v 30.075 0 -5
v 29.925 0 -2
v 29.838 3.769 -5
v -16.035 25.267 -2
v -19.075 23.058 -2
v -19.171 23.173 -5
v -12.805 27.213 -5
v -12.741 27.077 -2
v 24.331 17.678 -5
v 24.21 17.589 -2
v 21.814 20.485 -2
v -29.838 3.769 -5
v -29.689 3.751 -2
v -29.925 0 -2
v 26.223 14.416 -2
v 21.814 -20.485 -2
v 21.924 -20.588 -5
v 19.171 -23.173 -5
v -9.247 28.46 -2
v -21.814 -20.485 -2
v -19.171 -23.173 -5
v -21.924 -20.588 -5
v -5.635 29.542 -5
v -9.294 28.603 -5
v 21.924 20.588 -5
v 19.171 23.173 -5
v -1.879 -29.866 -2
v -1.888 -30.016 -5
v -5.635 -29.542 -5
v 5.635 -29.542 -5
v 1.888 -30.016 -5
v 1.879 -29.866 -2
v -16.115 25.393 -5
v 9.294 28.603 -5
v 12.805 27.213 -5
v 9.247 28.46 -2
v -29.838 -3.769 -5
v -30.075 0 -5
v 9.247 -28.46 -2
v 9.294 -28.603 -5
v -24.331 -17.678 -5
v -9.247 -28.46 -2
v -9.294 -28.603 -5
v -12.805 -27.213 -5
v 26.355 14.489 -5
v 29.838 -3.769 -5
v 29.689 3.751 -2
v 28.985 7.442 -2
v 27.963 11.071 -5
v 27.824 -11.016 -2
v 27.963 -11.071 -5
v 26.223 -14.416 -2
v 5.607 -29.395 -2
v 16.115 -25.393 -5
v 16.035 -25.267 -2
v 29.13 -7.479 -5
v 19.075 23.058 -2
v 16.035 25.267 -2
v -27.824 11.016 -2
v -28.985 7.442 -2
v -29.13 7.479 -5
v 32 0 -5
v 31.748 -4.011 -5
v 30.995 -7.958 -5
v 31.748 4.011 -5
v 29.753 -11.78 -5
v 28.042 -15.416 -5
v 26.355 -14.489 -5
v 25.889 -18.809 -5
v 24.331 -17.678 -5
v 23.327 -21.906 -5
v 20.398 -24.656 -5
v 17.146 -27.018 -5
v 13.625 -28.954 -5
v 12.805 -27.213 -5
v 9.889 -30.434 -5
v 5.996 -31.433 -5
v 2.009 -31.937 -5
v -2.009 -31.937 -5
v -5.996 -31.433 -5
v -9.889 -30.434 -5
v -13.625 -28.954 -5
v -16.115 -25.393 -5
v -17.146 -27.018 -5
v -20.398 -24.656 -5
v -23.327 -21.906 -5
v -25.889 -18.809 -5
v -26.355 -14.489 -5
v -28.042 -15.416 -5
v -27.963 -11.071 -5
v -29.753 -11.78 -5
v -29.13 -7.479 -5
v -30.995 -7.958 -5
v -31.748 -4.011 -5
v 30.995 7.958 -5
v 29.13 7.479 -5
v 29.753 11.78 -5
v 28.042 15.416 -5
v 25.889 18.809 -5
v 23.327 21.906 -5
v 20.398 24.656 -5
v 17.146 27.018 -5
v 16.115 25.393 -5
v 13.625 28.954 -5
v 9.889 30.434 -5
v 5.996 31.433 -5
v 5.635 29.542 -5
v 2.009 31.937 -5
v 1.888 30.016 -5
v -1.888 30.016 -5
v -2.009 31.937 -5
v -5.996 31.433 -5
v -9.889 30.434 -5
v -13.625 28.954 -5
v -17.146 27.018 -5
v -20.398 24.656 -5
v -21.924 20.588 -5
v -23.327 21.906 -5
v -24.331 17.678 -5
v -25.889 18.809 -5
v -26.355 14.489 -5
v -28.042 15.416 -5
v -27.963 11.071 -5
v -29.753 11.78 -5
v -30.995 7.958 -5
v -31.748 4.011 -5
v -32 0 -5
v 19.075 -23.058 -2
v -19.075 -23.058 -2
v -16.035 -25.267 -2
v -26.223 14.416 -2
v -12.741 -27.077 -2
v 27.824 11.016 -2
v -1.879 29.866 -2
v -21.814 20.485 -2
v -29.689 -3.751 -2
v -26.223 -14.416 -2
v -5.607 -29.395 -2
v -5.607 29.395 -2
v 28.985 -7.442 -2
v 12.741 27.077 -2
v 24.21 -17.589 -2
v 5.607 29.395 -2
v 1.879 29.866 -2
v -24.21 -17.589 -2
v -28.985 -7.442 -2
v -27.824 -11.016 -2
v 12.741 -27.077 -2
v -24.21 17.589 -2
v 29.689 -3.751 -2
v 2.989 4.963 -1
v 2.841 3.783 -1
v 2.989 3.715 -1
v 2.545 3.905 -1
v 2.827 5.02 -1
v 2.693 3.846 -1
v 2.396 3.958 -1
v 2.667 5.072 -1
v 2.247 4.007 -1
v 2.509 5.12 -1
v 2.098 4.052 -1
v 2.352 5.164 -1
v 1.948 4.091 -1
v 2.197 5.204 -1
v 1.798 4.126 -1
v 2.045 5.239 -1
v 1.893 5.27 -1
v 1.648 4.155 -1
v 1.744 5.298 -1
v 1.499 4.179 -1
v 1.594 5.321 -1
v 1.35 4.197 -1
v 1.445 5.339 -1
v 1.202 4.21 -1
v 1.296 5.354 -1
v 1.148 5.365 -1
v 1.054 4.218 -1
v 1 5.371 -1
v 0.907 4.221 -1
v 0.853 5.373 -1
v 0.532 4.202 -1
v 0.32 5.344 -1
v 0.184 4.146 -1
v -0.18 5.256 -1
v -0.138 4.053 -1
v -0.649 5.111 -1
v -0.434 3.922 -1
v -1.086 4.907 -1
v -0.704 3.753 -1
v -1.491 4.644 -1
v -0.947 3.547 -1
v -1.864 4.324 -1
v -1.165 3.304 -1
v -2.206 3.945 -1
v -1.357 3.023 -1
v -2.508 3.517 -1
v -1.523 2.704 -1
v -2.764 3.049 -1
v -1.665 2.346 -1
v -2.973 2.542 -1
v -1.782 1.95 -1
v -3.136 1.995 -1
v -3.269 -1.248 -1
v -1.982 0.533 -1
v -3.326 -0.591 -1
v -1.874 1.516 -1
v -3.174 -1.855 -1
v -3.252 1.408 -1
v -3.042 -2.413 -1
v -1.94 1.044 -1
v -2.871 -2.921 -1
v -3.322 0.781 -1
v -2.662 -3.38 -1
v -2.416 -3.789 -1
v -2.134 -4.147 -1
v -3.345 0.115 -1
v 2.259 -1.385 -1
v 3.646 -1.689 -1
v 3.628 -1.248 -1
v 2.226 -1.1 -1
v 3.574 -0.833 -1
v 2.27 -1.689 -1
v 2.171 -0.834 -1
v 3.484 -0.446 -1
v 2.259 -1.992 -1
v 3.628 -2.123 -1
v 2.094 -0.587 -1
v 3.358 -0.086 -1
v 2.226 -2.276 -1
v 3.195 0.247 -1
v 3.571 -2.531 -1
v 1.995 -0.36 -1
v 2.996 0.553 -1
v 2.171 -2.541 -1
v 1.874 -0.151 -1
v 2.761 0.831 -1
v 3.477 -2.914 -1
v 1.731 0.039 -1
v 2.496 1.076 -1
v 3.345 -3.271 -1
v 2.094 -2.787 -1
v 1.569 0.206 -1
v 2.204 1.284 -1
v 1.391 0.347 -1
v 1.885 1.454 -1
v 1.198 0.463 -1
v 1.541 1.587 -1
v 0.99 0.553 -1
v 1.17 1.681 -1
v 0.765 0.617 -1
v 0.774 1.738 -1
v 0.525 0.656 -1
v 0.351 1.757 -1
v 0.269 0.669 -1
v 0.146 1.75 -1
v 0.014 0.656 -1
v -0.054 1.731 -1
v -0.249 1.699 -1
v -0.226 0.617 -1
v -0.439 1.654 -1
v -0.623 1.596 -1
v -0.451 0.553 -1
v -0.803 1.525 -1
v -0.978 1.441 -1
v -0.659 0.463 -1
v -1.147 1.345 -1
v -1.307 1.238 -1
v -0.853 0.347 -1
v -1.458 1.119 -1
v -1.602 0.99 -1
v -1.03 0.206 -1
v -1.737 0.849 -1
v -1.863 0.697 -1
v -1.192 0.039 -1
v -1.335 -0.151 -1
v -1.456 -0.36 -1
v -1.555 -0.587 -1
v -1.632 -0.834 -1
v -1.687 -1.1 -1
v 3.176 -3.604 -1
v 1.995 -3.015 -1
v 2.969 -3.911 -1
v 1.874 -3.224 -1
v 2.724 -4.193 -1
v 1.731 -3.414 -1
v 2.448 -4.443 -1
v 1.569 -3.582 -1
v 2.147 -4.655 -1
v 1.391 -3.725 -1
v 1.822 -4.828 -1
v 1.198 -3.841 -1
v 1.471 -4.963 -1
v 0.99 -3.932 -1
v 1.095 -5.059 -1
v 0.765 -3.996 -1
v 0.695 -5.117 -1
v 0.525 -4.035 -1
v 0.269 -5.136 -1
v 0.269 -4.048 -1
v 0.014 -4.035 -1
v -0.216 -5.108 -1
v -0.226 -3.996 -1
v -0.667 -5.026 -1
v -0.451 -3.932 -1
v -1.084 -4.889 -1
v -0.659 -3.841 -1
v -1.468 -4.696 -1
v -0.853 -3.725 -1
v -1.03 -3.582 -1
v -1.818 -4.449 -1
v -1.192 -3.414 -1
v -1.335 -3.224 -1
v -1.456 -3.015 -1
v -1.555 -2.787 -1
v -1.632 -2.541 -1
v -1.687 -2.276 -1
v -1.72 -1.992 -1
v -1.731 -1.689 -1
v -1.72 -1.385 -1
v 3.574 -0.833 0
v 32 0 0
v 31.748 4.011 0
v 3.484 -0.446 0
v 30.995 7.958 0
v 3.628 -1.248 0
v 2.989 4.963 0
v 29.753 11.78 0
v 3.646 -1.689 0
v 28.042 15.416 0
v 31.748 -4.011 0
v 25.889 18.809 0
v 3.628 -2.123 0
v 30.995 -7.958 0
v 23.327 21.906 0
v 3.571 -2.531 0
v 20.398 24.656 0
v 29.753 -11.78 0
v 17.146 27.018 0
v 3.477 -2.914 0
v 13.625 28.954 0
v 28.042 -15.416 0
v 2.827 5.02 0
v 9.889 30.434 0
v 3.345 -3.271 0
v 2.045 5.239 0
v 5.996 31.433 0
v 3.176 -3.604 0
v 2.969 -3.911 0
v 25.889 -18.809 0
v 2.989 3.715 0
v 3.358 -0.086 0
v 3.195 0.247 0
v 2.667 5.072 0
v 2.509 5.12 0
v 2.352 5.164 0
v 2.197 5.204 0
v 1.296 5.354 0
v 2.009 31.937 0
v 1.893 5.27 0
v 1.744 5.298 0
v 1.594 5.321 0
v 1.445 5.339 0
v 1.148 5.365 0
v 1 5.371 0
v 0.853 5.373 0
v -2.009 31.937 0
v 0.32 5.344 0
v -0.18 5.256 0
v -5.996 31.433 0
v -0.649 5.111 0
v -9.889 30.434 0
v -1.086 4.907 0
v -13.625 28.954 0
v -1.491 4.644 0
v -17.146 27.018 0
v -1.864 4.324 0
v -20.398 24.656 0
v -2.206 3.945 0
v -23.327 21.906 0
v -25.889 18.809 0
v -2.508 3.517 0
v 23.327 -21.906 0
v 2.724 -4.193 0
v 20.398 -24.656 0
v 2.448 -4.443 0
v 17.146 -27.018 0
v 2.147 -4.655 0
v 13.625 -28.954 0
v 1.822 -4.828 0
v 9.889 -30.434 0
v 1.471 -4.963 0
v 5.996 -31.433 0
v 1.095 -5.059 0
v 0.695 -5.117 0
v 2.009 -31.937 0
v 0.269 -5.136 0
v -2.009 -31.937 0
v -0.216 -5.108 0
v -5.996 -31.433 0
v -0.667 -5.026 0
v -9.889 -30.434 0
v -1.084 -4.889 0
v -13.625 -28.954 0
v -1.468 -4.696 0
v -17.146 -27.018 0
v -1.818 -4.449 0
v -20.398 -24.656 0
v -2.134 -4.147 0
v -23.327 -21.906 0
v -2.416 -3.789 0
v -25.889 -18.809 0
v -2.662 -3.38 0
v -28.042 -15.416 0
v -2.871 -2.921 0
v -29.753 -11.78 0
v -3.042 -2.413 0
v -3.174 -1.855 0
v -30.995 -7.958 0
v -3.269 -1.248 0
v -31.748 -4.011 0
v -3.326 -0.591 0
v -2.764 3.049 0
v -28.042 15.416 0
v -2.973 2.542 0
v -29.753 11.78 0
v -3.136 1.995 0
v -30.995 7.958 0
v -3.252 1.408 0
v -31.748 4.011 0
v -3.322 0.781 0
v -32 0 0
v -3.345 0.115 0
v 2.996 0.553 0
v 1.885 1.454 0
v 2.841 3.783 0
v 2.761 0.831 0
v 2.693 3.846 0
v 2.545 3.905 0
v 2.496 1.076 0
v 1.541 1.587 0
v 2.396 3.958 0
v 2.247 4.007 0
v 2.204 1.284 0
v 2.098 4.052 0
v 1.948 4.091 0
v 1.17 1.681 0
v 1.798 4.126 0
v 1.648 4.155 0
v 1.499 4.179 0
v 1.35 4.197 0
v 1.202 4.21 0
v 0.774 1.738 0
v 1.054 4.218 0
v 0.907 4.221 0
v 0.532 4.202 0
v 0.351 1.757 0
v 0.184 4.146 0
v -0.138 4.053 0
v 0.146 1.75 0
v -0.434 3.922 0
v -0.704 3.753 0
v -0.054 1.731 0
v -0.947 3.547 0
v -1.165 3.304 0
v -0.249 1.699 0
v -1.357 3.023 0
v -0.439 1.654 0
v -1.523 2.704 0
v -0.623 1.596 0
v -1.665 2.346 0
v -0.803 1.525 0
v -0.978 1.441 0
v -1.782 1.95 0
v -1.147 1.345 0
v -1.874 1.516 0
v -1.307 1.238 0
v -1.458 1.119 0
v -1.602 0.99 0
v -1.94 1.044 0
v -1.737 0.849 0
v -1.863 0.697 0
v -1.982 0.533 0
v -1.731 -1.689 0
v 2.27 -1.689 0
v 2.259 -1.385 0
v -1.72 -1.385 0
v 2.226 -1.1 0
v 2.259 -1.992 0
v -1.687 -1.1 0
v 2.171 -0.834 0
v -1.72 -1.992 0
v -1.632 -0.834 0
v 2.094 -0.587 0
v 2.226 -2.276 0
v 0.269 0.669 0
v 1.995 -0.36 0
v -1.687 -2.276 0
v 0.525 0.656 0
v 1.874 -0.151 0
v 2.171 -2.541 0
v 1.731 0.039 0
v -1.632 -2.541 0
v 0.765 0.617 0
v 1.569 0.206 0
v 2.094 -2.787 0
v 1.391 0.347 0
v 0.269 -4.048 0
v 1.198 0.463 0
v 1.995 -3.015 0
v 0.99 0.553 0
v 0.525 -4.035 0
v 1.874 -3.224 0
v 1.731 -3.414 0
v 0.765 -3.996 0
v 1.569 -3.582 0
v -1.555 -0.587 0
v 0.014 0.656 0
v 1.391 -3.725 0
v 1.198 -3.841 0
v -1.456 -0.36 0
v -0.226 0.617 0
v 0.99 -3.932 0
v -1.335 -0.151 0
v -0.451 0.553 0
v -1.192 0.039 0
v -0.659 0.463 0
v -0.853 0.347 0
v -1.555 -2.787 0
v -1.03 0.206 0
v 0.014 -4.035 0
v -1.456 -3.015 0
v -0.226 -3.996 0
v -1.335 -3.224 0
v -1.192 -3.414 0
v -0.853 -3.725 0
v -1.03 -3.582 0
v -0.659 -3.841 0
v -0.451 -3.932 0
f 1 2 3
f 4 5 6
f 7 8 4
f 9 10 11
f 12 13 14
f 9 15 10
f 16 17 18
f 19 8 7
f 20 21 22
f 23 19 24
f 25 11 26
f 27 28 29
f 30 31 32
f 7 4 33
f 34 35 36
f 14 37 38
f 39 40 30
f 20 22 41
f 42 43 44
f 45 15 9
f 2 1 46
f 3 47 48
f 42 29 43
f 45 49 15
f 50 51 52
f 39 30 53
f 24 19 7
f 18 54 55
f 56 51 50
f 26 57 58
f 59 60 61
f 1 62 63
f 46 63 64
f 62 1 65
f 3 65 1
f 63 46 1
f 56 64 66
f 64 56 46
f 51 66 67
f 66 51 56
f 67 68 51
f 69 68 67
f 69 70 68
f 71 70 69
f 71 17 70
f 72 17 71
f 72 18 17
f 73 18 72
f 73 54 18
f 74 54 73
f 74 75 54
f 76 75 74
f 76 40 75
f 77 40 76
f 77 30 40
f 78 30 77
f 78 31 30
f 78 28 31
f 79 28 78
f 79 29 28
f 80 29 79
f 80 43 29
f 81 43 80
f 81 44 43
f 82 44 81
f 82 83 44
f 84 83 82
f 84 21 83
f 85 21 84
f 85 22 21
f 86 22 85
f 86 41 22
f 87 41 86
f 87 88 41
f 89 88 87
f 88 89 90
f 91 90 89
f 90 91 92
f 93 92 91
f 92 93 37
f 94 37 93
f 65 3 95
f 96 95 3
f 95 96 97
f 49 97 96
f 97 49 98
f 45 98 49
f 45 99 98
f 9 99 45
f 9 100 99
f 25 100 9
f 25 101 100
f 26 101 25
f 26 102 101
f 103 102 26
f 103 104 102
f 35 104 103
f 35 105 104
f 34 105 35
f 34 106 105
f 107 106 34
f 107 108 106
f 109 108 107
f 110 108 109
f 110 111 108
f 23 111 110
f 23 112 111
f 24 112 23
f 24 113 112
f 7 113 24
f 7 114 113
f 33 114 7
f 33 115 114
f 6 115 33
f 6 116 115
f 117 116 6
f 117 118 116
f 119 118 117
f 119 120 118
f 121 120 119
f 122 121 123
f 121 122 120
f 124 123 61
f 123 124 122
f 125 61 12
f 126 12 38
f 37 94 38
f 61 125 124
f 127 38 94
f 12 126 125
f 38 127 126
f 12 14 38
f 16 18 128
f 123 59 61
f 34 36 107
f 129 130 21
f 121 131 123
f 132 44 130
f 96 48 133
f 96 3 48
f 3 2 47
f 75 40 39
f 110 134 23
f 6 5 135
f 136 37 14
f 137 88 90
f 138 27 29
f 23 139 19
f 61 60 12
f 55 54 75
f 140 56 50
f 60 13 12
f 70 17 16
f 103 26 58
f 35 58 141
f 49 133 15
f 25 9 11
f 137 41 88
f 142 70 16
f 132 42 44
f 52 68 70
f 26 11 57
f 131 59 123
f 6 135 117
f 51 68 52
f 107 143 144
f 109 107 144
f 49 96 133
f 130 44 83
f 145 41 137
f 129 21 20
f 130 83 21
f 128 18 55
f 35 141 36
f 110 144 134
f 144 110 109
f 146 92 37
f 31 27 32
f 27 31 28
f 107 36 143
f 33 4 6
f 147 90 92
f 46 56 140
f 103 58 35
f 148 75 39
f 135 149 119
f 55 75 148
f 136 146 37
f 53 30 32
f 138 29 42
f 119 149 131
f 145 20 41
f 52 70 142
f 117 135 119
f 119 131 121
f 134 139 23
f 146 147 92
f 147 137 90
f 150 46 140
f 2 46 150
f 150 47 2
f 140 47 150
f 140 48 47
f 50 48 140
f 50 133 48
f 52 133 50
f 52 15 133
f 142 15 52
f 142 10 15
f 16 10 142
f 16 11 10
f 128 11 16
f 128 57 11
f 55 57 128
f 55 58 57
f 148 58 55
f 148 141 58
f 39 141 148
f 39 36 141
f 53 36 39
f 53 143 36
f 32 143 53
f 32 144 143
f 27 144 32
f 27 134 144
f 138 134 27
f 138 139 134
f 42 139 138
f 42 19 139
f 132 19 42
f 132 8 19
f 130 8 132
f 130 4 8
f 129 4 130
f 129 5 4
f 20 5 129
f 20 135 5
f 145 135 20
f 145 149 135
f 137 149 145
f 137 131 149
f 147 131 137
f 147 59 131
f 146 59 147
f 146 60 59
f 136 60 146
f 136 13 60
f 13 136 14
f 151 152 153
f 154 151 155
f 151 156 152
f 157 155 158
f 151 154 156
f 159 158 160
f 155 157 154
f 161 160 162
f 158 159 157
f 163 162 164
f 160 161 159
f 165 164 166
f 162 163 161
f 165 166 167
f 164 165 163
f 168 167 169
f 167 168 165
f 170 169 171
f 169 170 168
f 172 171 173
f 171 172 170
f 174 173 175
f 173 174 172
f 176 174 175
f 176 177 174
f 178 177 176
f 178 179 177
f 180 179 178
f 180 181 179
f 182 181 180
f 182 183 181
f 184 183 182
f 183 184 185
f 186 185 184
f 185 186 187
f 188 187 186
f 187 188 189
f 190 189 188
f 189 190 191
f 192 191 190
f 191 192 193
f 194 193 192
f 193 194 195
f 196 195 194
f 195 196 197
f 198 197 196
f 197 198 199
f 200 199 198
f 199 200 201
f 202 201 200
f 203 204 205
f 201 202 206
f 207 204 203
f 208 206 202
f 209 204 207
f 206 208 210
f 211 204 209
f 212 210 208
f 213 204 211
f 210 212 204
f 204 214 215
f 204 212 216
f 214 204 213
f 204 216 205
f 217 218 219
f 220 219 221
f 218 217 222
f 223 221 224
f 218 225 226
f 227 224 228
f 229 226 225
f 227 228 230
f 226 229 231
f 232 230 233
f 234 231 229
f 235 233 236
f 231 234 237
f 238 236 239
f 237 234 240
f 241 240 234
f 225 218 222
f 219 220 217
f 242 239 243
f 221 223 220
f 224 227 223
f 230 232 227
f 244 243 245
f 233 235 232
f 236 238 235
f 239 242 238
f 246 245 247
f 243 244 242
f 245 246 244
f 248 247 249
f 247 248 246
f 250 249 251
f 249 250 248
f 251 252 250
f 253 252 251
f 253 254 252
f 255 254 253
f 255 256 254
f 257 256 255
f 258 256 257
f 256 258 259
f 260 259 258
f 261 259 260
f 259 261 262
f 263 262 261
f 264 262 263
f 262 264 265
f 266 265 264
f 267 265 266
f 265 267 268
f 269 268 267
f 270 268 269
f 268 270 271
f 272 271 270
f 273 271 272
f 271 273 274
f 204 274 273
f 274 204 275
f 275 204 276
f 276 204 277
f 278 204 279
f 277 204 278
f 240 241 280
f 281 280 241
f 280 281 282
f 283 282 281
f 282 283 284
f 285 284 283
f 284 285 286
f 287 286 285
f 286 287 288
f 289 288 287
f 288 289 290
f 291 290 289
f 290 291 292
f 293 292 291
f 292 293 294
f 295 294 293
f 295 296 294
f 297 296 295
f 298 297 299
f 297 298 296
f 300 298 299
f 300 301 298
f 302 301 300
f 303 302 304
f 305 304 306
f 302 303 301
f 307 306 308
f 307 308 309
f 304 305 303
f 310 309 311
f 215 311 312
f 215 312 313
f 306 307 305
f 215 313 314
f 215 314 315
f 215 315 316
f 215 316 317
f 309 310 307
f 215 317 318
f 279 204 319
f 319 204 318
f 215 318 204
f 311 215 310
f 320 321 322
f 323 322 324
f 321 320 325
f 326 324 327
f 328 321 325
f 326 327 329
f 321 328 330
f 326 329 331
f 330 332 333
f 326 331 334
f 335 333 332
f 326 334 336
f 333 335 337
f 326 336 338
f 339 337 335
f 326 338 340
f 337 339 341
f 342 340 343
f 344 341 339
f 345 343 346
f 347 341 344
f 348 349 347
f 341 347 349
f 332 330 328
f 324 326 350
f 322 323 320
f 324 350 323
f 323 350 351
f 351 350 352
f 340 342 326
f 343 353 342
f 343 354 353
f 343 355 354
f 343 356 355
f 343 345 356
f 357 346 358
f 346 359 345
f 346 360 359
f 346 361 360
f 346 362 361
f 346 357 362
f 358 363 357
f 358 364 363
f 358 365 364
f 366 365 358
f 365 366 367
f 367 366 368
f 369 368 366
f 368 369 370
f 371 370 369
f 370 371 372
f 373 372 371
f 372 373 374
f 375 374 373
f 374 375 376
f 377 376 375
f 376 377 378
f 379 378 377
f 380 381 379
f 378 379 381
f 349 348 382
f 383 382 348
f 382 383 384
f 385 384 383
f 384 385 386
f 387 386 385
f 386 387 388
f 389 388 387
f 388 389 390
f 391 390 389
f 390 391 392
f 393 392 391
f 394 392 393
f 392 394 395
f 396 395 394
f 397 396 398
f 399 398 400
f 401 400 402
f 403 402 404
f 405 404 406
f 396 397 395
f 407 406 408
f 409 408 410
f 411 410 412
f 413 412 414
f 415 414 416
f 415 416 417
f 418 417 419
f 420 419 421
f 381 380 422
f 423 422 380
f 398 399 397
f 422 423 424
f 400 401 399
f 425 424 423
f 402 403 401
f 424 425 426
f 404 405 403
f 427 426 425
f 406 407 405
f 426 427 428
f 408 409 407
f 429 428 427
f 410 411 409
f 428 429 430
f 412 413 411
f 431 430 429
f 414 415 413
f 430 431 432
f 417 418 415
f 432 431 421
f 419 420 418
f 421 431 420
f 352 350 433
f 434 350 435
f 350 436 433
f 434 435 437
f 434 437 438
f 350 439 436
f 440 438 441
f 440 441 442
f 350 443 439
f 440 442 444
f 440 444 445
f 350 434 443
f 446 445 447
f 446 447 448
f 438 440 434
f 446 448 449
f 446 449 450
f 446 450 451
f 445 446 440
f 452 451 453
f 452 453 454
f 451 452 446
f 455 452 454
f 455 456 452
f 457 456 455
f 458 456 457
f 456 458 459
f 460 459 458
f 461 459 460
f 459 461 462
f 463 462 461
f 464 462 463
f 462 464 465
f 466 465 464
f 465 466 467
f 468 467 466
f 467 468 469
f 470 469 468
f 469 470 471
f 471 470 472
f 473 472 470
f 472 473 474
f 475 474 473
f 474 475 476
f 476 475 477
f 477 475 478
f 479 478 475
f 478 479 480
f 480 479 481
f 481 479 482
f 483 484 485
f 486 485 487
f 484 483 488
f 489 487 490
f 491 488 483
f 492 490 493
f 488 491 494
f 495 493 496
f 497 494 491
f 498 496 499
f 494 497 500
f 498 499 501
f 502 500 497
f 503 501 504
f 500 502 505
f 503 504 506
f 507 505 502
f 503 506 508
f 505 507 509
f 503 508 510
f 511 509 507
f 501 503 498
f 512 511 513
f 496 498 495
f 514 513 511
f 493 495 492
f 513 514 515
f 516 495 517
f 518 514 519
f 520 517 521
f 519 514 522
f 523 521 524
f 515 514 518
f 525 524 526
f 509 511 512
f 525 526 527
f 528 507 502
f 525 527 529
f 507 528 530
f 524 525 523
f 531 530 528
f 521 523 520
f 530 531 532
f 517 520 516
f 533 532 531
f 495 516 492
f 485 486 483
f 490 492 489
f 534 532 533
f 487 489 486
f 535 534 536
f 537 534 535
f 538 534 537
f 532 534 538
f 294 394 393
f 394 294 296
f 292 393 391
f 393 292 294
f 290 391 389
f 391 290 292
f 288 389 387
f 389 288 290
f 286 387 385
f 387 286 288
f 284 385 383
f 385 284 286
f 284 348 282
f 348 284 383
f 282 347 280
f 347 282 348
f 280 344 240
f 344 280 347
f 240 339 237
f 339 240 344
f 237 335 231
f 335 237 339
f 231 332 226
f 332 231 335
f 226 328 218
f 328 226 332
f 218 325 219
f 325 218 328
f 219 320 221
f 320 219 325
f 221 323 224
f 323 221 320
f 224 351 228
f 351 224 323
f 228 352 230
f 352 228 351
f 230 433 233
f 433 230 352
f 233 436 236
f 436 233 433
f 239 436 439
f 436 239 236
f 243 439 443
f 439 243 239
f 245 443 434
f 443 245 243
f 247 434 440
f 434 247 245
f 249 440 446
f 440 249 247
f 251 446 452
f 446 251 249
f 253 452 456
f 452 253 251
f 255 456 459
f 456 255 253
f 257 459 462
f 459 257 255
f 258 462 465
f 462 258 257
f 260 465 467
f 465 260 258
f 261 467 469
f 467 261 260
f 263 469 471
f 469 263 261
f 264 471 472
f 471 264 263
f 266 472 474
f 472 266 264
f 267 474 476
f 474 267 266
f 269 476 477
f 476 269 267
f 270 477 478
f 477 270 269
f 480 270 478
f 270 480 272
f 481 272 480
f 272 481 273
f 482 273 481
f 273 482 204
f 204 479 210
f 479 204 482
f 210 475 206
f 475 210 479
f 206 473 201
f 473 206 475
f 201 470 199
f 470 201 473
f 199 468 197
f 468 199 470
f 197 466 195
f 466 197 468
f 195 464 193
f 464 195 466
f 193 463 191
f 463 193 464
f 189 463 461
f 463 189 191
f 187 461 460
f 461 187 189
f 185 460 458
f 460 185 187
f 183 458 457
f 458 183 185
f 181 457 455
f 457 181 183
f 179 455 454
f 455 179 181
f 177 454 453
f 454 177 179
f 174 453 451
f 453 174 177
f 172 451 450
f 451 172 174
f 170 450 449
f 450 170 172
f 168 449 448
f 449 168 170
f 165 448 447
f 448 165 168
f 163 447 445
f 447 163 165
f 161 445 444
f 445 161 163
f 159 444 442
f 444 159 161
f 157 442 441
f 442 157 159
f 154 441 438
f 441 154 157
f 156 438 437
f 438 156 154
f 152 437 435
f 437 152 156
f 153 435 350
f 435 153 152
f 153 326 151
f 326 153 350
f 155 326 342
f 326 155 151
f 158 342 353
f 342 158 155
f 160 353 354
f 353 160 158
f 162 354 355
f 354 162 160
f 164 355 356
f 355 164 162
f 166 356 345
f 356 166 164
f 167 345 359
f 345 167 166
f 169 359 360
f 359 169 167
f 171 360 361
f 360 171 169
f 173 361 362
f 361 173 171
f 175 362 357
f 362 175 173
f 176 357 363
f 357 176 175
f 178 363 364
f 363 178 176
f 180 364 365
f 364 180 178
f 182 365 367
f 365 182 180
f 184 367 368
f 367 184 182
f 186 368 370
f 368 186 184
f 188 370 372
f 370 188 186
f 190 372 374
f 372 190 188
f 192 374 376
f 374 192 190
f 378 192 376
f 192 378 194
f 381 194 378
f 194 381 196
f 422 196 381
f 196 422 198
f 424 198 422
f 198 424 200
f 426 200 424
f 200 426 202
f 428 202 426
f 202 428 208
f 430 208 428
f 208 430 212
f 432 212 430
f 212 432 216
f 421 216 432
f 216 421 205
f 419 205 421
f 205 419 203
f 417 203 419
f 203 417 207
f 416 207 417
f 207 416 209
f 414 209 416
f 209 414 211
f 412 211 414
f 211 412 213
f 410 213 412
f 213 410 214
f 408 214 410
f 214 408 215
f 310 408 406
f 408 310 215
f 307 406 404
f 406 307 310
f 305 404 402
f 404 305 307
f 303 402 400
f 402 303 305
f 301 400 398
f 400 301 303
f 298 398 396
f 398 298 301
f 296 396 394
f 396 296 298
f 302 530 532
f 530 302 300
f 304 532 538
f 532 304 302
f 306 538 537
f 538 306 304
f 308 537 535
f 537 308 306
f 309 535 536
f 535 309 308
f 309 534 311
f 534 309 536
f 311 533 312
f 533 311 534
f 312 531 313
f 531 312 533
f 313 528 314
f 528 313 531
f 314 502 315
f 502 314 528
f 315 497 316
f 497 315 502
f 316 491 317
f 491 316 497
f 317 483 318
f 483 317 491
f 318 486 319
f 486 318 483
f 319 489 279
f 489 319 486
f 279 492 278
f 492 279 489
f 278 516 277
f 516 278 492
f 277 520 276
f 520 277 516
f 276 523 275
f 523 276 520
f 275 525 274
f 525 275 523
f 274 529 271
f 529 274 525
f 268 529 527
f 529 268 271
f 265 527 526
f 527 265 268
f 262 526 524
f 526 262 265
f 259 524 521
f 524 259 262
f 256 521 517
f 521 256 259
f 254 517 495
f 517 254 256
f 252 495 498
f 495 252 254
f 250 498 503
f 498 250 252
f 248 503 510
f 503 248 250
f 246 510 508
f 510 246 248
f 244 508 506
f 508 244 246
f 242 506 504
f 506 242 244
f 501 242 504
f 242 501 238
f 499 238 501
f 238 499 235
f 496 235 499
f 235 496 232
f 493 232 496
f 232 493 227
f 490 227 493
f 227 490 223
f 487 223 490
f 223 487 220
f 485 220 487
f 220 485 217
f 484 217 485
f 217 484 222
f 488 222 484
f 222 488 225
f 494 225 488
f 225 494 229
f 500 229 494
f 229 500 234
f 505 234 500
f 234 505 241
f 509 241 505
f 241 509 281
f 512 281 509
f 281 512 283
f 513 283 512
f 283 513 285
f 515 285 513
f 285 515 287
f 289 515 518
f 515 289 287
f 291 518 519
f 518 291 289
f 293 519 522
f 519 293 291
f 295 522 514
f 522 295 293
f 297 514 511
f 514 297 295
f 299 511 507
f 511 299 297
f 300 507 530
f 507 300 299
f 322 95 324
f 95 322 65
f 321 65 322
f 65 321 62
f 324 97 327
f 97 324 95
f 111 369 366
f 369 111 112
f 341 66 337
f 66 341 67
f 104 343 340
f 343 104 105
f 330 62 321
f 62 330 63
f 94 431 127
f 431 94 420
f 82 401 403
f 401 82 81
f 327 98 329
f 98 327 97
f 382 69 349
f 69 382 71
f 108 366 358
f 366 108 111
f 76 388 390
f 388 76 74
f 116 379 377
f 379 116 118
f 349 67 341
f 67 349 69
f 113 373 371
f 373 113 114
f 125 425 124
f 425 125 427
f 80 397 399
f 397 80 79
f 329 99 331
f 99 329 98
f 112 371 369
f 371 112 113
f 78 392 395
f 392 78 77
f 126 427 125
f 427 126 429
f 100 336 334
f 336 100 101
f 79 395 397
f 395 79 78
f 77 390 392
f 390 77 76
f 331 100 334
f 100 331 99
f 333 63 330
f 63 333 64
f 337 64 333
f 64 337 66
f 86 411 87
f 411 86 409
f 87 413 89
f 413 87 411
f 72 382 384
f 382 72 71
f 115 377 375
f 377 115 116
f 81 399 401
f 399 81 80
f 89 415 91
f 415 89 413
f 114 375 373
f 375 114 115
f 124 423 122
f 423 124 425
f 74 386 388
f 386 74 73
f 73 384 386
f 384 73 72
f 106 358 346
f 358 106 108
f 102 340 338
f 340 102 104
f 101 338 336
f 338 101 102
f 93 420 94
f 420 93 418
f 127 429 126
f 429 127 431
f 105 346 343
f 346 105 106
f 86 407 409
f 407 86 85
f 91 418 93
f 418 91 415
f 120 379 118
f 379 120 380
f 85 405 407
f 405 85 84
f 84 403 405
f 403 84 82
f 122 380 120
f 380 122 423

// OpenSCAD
$fn = 50;

difference() {
	union() {
		translate(v = [0, 0, -5.0]) {
			cylinder(h = 5, r = 32.0);
		}
	}
	union() {
		#translate(v = [0, 0, -5.0]) {
			cylinder(h = 3, r1 = 30.075, r2 = 29.925);
		}
		translate(v = [0, 0, -1]) {
			linear_extrude(height = 1) {
				text(font = "Impact", halign = "center", size = 10, text = "6", valign = "center");
			}
		}
	}
}
